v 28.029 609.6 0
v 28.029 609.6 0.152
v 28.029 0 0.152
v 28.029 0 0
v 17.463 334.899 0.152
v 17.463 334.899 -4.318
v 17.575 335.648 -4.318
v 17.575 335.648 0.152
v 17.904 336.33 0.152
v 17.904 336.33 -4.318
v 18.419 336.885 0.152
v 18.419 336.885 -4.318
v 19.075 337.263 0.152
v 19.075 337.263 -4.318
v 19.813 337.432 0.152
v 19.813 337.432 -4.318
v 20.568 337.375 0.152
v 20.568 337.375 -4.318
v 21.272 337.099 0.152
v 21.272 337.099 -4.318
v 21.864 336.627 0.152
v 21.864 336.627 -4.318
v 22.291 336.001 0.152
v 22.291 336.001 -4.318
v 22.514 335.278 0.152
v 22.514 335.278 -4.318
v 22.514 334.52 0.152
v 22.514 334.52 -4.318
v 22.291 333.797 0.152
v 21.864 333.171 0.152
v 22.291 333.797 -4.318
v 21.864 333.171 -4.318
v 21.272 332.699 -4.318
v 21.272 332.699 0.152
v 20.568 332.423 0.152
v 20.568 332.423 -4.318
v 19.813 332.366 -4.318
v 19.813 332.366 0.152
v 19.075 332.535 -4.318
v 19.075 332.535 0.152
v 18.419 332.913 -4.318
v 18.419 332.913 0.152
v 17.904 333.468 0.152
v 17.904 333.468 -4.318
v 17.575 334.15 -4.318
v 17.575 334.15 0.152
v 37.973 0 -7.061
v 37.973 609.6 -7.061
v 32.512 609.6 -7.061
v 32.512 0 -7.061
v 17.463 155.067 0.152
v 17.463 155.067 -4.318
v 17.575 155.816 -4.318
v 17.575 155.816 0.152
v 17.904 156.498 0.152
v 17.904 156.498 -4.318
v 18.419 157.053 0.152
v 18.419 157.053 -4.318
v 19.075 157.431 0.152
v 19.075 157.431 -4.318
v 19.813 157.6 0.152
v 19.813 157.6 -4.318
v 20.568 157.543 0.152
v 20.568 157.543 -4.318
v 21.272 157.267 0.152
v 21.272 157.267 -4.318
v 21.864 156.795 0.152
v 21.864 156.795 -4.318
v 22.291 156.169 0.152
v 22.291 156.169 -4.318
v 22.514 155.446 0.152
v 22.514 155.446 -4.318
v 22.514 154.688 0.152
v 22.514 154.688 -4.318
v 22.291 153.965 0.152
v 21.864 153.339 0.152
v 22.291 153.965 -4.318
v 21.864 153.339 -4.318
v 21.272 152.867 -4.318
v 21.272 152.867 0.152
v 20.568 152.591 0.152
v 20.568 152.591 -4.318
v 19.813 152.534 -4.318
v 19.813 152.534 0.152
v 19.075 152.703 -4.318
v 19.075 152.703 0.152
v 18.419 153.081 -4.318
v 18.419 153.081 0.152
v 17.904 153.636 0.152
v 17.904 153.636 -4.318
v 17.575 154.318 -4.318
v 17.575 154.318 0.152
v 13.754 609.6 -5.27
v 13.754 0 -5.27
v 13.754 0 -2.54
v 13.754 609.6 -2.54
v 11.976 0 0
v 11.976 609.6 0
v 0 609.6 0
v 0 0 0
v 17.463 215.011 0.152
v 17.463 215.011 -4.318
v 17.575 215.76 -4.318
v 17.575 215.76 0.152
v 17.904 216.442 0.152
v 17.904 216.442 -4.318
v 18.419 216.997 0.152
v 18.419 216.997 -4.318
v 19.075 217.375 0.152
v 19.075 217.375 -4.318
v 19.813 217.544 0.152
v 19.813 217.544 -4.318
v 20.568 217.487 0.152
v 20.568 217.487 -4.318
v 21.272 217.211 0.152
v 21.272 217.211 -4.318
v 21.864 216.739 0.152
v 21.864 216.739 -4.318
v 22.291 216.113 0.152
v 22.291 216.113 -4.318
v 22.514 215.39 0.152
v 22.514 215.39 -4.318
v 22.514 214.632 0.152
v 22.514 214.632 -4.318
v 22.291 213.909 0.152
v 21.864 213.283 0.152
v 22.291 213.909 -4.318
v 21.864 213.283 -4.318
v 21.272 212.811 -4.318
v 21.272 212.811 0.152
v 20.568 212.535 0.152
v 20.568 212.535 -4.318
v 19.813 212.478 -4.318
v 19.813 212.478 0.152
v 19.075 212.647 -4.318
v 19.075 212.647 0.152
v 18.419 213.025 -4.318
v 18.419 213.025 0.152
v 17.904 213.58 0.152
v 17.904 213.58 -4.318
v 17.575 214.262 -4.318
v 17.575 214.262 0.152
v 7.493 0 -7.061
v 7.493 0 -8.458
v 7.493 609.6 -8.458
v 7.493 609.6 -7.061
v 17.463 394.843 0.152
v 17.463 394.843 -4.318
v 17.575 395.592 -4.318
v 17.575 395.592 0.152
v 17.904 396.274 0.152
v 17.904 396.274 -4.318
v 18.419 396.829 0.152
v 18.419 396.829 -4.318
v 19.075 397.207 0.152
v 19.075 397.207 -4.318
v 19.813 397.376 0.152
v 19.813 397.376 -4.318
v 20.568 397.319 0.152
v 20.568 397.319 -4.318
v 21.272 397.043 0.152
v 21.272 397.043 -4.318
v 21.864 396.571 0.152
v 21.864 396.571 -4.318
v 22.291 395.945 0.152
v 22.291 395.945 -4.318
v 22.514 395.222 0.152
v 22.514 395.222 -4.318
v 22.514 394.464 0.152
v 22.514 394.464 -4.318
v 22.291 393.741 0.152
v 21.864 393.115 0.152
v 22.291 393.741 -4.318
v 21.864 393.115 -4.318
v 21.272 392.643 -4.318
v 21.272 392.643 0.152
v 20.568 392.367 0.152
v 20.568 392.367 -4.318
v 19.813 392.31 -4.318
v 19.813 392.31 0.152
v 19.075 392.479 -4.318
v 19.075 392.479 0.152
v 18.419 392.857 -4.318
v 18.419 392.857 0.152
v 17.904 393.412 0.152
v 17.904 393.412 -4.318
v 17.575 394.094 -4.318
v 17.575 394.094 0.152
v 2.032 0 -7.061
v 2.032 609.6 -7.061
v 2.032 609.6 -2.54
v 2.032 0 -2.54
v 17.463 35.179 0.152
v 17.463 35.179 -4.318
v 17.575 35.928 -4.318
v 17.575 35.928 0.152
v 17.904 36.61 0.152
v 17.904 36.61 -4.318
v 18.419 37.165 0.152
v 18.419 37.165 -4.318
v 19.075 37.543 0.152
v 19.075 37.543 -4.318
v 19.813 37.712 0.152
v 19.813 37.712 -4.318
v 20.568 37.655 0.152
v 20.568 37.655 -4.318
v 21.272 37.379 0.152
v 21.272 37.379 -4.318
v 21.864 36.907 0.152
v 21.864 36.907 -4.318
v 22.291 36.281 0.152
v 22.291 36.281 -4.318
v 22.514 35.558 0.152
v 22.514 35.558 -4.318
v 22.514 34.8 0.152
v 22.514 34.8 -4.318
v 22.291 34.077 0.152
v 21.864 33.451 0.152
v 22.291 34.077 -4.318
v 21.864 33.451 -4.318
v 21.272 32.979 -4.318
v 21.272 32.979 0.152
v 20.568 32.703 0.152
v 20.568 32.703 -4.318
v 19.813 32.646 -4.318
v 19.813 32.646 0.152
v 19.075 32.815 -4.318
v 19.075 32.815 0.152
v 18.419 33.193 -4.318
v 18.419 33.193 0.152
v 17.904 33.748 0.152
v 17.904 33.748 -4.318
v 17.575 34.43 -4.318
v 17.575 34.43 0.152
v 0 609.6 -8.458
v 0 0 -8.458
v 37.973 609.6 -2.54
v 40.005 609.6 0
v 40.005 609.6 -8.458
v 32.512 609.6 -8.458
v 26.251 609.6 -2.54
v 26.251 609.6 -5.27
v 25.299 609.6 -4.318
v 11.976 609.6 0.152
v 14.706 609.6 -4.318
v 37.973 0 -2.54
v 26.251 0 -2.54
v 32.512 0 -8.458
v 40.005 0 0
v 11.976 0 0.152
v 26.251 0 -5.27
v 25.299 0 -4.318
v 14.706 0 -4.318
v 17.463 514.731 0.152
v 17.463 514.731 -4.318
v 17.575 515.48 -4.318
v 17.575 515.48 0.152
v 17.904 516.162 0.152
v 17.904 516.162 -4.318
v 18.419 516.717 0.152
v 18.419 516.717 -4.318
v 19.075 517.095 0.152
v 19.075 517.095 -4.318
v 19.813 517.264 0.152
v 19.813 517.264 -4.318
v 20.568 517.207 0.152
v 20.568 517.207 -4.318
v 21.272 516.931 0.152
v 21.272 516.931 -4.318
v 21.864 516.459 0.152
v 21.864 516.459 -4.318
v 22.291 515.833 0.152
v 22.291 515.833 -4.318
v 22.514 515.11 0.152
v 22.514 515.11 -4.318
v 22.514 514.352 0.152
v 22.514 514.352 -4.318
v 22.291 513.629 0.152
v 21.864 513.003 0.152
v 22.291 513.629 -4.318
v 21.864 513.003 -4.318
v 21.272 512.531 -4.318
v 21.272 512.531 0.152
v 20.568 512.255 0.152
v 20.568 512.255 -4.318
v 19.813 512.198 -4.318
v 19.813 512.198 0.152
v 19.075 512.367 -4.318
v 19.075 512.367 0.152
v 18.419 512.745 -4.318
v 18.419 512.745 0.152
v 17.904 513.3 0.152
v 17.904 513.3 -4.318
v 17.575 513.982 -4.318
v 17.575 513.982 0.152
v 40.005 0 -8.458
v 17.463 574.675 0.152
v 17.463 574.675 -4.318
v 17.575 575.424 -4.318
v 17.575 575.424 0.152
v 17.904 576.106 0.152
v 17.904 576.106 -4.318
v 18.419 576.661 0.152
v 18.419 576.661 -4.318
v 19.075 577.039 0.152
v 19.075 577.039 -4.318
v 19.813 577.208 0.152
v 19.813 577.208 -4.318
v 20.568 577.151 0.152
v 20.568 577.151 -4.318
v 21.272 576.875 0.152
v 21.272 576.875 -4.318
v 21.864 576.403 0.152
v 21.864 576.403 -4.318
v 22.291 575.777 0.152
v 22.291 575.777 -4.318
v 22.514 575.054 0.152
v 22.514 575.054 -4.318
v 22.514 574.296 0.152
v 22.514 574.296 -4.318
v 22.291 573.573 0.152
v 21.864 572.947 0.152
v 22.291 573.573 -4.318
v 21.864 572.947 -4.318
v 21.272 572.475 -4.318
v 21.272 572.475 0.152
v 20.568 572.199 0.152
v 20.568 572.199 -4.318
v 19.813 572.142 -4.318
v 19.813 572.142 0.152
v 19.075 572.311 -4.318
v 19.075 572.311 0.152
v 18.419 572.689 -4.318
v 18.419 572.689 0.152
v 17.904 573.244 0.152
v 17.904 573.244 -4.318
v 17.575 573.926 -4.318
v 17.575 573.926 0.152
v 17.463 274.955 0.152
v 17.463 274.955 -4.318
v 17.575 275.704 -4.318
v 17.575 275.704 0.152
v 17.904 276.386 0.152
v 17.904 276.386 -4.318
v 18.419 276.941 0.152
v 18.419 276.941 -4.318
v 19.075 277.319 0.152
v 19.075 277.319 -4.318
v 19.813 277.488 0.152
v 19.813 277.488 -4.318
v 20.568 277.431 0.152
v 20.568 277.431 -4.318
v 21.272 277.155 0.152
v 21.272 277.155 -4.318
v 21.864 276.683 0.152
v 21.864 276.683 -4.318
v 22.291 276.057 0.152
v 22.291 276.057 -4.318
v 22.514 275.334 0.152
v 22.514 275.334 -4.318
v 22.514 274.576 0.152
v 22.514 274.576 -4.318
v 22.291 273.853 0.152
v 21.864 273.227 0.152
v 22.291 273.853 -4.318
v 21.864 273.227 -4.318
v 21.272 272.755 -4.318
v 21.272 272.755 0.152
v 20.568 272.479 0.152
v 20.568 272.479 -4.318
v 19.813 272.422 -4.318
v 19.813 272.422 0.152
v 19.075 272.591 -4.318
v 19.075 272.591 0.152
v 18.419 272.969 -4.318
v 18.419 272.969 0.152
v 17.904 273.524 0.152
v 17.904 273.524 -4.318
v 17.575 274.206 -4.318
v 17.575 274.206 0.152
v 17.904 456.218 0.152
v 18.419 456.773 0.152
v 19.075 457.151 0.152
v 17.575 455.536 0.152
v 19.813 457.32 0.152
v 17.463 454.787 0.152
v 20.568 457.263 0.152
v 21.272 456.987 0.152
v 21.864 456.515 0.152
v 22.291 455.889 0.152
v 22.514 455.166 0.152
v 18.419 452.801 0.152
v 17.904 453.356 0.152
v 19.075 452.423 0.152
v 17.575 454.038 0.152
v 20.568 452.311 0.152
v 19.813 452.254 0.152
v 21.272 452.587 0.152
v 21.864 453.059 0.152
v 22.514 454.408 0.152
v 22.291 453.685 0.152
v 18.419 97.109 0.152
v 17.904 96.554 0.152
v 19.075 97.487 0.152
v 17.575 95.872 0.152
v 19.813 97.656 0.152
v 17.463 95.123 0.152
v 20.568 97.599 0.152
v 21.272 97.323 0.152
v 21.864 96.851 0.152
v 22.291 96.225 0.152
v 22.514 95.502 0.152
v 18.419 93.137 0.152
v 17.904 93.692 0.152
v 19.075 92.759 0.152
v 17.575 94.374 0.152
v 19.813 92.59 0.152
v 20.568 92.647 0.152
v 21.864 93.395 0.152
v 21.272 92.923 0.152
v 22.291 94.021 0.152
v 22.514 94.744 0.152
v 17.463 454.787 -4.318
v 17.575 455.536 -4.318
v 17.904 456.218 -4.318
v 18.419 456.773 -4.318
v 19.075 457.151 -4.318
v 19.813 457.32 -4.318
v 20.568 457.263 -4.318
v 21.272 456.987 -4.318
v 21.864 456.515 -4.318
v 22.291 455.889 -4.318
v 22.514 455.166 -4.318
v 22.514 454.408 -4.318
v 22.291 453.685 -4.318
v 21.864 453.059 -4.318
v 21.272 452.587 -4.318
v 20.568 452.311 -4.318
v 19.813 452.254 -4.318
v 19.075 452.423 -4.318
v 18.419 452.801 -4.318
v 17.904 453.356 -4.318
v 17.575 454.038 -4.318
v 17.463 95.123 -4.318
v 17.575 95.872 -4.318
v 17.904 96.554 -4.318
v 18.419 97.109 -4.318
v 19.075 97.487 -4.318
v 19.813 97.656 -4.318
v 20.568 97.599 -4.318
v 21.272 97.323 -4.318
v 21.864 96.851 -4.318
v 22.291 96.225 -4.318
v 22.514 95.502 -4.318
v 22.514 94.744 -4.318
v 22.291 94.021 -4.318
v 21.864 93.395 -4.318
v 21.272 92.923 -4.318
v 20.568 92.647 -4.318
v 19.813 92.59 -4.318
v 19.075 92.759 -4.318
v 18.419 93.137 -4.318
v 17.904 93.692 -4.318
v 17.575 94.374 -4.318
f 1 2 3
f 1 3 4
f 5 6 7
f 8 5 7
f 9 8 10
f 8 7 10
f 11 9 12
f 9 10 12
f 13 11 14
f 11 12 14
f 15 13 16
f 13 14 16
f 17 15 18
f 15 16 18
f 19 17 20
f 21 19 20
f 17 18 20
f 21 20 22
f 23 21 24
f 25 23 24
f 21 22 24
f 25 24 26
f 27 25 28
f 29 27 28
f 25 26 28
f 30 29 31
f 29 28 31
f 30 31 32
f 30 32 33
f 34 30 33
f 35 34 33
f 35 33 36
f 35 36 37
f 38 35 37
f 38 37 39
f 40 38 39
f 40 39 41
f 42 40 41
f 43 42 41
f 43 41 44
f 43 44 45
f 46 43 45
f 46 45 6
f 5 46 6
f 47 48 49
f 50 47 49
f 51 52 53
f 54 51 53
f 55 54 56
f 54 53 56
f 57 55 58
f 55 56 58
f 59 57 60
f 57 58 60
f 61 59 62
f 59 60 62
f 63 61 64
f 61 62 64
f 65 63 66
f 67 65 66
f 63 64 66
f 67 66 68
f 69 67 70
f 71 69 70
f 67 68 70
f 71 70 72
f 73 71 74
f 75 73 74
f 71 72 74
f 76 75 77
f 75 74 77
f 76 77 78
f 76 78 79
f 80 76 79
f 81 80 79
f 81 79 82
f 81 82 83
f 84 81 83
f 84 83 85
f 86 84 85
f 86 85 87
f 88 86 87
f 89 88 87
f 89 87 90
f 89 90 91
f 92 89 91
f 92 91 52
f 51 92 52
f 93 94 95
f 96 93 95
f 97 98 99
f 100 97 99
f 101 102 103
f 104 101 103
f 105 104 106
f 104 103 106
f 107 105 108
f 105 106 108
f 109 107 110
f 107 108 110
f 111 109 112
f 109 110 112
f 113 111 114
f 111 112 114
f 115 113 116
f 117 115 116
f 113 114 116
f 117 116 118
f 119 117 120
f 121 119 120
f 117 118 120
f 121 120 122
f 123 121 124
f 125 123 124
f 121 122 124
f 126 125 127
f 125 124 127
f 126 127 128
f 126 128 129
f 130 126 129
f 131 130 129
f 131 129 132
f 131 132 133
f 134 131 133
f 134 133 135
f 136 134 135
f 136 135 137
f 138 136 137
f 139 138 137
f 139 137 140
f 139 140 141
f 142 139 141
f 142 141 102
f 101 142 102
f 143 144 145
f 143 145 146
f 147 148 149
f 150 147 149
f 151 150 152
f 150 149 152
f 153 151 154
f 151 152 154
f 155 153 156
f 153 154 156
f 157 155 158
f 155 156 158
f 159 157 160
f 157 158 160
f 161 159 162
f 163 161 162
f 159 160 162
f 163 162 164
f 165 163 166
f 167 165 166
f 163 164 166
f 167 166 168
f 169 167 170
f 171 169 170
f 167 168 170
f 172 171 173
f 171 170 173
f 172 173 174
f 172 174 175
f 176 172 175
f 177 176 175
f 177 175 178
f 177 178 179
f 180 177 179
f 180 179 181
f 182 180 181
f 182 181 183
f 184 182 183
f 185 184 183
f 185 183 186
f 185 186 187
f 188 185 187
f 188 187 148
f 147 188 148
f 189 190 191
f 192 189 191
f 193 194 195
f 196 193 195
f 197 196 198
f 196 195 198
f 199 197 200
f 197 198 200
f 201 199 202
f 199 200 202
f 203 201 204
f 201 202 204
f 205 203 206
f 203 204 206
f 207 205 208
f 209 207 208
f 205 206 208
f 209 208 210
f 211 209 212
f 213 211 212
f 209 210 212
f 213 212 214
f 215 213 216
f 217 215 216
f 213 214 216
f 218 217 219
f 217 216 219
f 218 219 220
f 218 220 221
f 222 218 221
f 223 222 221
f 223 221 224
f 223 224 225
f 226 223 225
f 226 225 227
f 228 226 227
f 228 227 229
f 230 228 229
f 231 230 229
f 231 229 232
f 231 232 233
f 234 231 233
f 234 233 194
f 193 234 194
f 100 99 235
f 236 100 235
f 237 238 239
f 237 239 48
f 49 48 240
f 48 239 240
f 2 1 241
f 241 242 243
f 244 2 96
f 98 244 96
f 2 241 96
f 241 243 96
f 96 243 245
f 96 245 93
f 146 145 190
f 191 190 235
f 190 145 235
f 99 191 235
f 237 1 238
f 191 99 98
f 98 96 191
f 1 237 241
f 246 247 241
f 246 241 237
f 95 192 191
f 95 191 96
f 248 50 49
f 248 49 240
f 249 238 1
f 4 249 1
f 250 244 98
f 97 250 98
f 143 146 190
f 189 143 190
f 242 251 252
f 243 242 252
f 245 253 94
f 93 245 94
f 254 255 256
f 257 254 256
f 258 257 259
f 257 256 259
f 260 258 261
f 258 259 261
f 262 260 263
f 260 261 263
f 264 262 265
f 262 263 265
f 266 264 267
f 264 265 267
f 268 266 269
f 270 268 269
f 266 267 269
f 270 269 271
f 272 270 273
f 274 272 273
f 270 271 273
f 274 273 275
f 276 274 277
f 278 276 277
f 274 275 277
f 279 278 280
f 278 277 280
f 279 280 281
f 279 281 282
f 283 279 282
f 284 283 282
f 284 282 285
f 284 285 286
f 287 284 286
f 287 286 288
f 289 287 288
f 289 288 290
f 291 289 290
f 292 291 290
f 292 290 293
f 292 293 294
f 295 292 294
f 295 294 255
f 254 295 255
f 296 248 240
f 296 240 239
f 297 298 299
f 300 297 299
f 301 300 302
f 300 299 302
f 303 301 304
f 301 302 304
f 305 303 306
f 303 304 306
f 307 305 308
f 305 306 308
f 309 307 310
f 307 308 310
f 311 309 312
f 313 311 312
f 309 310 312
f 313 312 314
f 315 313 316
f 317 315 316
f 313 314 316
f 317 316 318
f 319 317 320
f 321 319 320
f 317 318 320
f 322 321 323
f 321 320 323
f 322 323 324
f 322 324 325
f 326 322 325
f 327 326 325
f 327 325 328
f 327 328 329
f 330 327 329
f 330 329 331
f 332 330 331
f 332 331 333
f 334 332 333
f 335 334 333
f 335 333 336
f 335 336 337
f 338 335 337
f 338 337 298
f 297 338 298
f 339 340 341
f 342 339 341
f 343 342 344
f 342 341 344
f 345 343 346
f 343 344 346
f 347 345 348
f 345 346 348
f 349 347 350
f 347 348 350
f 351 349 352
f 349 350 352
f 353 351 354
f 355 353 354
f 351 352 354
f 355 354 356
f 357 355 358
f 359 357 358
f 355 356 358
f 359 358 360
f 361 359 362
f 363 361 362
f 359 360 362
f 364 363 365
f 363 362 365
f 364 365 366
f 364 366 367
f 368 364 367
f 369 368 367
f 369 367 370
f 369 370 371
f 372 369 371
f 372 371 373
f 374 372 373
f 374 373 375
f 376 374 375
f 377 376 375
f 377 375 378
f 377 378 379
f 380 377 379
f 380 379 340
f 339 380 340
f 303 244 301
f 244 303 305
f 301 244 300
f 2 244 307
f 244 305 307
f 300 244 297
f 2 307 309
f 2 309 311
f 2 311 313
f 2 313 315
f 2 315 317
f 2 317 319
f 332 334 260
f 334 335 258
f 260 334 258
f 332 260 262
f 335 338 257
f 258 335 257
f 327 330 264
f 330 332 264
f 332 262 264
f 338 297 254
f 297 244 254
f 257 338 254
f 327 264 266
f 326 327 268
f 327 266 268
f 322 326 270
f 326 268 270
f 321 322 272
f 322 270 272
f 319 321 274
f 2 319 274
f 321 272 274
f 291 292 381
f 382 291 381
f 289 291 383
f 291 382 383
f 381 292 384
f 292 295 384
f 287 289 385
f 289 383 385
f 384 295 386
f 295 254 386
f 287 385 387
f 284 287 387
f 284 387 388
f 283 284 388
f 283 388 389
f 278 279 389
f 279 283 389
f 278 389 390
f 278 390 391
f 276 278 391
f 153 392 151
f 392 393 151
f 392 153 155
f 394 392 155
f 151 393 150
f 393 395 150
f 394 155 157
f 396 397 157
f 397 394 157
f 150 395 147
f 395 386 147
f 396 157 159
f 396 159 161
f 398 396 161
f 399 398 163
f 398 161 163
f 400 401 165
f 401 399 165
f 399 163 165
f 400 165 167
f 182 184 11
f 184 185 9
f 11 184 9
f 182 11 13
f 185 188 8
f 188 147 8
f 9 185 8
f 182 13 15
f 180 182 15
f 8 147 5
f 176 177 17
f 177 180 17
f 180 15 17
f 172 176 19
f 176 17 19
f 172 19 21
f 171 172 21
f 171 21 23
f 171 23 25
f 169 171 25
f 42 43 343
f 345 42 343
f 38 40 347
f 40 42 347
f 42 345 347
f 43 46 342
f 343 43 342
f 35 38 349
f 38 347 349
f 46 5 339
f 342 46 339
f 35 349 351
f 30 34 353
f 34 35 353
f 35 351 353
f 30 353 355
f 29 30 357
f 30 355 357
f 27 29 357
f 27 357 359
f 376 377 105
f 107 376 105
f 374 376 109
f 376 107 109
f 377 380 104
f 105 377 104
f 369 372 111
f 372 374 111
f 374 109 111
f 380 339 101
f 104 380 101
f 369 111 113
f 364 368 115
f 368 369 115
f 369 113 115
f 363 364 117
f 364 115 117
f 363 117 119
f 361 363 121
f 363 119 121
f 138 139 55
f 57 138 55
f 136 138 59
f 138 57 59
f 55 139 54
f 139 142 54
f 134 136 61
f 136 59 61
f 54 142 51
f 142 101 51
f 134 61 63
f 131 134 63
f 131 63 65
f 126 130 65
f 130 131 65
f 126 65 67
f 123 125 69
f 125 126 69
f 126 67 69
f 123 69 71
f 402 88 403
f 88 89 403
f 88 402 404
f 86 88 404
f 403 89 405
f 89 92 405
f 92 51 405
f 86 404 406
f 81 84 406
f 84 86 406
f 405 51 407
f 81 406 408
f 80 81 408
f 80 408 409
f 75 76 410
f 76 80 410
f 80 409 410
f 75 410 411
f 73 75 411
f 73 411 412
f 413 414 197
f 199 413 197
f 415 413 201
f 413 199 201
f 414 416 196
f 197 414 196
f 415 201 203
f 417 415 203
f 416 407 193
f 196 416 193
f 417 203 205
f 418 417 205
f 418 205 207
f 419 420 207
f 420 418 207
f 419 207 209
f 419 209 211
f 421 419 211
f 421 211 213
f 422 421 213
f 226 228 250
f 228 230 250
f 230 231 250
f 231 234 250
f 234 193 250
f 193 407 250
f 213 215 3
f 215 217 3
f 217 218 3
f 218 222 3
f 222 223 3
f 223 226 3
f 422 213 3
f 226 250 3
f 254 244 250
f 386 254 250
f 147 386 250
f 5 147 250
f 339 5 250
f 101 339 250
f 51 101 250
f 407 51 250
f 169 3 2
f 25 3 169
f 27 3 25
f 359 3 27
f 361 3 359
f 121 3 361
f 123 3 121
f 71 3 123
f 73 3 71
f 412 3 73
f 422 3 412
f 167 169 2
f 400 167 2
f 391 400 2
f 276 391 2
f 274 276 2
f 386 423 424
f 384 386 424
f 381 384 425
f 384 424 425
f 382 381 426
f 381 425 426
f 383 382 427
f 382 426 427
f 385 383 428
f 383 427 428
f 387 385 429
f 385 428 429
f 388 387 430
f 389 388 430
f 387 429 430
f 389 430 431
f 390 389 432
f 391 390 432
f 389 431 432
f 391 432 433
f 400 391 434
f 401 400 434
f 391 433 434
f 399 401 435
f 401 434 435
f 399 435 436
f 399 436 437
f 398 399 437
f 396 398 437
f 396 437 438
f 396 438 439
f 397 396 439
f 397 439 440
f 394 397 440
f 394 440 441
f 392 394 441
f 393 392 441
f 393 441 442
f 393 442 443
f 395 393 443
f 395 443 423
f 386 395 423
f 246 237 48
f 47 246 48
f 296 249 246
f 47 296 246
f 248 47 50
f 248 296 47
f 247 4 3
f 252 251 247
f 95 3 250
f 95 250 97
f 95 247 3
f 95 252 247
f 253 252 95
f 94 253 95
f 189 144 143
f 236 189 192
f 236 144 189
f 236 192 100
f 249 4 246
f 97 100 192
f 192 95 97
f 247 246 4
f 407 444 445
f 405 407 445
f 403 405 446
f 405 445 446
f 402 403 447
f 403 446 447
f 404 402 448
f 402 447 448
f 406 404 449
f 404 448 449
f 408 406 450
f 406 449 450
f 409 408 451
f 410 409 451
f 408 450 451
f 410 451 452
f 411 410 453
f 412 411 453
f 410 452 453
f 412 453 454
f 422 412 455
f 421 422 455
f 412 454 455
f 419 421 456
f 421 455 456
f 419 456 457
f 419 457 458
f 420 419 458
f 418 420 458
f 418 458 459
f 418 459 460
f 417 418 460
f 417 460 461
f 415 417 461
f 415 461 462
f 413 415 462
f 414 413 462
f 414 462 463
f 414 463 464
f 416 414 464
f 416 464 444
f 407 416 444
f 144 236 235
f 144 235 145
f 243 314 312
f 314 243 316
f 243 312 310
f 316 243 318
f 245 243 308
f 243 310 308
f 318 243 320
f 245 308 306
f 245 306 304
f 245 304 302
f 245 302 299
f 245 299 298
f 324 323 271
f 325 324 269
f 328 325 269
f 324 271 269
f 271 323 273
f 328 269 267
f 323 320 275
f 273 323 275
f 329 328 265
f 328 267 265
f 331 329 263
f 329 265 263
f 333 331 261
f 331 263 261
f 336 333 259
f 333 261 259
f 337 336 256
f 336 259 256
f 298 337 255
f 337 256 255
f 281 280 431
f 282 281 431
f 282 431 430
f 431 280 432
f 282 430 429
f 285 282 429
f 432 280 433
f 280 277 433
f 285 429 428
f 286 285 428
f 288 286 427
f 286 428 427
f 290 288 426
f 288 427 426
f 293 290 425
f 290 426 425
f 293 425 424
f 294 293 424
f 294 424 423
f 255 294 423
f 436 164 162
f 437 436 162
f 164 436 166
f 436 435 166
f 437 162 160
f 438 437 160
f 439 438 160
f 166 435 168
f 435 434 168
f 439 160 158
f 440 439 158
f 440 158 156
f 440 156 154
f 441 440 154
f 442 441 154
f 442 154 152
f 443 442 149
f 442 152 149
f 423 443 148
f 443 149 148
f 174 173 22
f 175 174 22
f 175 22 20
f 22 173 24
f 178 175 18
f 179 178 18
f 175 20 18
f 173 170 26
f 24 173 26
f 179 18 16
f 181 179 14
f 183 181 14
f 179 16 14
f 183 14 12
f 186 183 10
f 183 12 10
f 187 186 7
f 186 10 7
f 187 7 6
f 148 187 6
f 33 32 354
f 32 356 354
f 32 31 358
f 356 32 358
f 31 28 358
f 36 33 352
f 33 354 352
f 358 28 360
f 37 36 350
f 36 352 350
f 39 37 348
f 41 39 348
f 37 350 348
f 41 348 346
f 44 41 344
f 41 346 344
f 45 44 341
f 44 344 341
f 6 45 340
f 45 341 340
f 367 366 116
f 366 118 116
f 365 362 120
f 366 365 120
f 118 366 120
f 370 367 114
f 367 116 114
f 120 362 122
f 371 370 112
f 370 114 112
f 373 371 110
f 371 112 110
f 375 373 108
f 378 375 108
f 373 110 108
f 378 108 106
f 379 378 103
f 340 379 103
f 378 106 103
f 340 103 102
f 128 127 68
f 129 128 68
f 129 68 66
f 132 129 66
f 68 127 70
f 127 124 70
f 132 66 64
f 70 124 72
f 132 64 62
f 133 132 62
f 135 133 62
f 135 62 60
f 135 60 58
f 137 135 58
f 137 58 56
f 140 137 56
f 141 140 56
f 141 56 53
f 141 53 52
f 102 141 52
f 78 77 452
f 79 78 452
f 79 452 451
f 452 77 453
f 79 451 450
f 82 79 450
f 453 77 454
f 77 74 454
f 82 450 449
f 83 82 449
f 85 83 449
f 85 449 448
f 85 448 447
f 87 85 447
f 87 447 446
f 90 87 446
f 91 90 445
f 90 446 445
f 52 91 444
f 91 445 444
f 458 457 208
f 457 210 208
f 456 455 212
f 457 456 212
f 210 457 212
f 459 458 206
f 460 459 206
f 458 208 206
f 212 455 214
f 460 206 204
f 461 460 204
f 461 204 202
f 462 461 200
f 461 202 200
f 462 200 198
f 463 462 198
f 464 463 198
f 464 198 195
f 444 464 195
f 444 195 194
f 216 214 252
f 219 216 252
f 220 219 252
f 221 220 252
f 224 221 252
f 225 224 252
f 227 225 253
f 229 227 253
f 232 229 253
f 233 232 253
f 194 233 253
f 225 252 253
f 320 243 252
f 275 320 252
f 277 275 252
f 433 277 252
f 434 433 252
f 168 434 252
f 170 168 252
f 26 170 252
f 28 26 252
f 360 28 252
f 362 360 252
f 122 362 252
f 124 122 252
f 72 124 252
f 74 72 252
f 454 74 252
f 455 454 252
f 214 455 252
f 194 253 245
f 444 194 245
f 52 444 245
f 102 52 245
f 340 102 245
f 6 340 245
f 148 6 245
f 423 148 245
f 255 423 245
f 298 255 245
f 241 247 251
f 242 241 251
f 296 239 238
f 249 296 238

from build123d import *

# Parameters (mm, degrees)
BOSS_EXTRUDE1_DEPTH = 609.6
SKETCH2_R           = 2.54
CUT_EXTRUDE1_DEPTH  = 508


with BuildPart() as part:
    # Sketch1 → Boss-Extrude1 (new body)
    with BuildSketch(Plane(origin=(0, 0, 0), x_dir=(1, 0, 0), z_dir=(0, 1, 0))):
        Polygon((0, 8.4582), (0, 0), (11.9761, 0), (11.9761, -0.1524), (28.0289, -0.1524), (28.0289, 0), (40.005, 0), (40.005, 8.4582), (32.512, 8.4582), (32.512, 7.0612), (37.973, 7.0612), (37.973, 2.54), (26.2509, 2.54), (26.2509, 5.269994695), (25.298905305, 4.318), (14.706094695, 4.318), (13.7541, 5.269994695), (13.7541, 2.54), (2.032, 2.54), (2.032, 7.0612), (7.493, 7.0612), (7.493, 8.4582), align=None)
    extrude(amount=BOSS_EXTRUDE1_DEPTH)

    # Sketch2 → Cut-Extrude1 (cut)
    with BuildSketch(Plane(origin=(0, 0, -4.318), x_dir=(-1, 0, 0), z_dir=(0, 0, -1))):
        with Locations((-20.0025, 574.675)):
            Circle(SKETCH2_R)
        with Locations((-20.0025, 514.731)):
            Circle(SKETCH2_R)
        with Locations((-20.0025, 454.787)):
            Circle(SKETCH2_R)
        with Locations((-20.0025, 394.843)):
            Circle(SKETCH2_R)
        with Locations((-20.0025, 334.899)):
            Circle(SKETCH2_R)
        with Locations((-20.0025, 274.955)):
            Circle(SKETCH2_R)
        with Locations((-20.0025, 215.011)):
            Circle(SKETCH2_R)
        with Locations((-20.0025, 155.067)):
            Circle(SKETCH2_R)
        with Locations((-20.0025, 95.123)):
            Circle(SKETCH2_R)
        with Locations((-20.0025, 35.179)):
            Circle(SKETCH2_R)
    extrude(amount=-CUT_EXTRUDE1_DEPTH, mode=Mode.SUBTRACT)


solid = part.part
